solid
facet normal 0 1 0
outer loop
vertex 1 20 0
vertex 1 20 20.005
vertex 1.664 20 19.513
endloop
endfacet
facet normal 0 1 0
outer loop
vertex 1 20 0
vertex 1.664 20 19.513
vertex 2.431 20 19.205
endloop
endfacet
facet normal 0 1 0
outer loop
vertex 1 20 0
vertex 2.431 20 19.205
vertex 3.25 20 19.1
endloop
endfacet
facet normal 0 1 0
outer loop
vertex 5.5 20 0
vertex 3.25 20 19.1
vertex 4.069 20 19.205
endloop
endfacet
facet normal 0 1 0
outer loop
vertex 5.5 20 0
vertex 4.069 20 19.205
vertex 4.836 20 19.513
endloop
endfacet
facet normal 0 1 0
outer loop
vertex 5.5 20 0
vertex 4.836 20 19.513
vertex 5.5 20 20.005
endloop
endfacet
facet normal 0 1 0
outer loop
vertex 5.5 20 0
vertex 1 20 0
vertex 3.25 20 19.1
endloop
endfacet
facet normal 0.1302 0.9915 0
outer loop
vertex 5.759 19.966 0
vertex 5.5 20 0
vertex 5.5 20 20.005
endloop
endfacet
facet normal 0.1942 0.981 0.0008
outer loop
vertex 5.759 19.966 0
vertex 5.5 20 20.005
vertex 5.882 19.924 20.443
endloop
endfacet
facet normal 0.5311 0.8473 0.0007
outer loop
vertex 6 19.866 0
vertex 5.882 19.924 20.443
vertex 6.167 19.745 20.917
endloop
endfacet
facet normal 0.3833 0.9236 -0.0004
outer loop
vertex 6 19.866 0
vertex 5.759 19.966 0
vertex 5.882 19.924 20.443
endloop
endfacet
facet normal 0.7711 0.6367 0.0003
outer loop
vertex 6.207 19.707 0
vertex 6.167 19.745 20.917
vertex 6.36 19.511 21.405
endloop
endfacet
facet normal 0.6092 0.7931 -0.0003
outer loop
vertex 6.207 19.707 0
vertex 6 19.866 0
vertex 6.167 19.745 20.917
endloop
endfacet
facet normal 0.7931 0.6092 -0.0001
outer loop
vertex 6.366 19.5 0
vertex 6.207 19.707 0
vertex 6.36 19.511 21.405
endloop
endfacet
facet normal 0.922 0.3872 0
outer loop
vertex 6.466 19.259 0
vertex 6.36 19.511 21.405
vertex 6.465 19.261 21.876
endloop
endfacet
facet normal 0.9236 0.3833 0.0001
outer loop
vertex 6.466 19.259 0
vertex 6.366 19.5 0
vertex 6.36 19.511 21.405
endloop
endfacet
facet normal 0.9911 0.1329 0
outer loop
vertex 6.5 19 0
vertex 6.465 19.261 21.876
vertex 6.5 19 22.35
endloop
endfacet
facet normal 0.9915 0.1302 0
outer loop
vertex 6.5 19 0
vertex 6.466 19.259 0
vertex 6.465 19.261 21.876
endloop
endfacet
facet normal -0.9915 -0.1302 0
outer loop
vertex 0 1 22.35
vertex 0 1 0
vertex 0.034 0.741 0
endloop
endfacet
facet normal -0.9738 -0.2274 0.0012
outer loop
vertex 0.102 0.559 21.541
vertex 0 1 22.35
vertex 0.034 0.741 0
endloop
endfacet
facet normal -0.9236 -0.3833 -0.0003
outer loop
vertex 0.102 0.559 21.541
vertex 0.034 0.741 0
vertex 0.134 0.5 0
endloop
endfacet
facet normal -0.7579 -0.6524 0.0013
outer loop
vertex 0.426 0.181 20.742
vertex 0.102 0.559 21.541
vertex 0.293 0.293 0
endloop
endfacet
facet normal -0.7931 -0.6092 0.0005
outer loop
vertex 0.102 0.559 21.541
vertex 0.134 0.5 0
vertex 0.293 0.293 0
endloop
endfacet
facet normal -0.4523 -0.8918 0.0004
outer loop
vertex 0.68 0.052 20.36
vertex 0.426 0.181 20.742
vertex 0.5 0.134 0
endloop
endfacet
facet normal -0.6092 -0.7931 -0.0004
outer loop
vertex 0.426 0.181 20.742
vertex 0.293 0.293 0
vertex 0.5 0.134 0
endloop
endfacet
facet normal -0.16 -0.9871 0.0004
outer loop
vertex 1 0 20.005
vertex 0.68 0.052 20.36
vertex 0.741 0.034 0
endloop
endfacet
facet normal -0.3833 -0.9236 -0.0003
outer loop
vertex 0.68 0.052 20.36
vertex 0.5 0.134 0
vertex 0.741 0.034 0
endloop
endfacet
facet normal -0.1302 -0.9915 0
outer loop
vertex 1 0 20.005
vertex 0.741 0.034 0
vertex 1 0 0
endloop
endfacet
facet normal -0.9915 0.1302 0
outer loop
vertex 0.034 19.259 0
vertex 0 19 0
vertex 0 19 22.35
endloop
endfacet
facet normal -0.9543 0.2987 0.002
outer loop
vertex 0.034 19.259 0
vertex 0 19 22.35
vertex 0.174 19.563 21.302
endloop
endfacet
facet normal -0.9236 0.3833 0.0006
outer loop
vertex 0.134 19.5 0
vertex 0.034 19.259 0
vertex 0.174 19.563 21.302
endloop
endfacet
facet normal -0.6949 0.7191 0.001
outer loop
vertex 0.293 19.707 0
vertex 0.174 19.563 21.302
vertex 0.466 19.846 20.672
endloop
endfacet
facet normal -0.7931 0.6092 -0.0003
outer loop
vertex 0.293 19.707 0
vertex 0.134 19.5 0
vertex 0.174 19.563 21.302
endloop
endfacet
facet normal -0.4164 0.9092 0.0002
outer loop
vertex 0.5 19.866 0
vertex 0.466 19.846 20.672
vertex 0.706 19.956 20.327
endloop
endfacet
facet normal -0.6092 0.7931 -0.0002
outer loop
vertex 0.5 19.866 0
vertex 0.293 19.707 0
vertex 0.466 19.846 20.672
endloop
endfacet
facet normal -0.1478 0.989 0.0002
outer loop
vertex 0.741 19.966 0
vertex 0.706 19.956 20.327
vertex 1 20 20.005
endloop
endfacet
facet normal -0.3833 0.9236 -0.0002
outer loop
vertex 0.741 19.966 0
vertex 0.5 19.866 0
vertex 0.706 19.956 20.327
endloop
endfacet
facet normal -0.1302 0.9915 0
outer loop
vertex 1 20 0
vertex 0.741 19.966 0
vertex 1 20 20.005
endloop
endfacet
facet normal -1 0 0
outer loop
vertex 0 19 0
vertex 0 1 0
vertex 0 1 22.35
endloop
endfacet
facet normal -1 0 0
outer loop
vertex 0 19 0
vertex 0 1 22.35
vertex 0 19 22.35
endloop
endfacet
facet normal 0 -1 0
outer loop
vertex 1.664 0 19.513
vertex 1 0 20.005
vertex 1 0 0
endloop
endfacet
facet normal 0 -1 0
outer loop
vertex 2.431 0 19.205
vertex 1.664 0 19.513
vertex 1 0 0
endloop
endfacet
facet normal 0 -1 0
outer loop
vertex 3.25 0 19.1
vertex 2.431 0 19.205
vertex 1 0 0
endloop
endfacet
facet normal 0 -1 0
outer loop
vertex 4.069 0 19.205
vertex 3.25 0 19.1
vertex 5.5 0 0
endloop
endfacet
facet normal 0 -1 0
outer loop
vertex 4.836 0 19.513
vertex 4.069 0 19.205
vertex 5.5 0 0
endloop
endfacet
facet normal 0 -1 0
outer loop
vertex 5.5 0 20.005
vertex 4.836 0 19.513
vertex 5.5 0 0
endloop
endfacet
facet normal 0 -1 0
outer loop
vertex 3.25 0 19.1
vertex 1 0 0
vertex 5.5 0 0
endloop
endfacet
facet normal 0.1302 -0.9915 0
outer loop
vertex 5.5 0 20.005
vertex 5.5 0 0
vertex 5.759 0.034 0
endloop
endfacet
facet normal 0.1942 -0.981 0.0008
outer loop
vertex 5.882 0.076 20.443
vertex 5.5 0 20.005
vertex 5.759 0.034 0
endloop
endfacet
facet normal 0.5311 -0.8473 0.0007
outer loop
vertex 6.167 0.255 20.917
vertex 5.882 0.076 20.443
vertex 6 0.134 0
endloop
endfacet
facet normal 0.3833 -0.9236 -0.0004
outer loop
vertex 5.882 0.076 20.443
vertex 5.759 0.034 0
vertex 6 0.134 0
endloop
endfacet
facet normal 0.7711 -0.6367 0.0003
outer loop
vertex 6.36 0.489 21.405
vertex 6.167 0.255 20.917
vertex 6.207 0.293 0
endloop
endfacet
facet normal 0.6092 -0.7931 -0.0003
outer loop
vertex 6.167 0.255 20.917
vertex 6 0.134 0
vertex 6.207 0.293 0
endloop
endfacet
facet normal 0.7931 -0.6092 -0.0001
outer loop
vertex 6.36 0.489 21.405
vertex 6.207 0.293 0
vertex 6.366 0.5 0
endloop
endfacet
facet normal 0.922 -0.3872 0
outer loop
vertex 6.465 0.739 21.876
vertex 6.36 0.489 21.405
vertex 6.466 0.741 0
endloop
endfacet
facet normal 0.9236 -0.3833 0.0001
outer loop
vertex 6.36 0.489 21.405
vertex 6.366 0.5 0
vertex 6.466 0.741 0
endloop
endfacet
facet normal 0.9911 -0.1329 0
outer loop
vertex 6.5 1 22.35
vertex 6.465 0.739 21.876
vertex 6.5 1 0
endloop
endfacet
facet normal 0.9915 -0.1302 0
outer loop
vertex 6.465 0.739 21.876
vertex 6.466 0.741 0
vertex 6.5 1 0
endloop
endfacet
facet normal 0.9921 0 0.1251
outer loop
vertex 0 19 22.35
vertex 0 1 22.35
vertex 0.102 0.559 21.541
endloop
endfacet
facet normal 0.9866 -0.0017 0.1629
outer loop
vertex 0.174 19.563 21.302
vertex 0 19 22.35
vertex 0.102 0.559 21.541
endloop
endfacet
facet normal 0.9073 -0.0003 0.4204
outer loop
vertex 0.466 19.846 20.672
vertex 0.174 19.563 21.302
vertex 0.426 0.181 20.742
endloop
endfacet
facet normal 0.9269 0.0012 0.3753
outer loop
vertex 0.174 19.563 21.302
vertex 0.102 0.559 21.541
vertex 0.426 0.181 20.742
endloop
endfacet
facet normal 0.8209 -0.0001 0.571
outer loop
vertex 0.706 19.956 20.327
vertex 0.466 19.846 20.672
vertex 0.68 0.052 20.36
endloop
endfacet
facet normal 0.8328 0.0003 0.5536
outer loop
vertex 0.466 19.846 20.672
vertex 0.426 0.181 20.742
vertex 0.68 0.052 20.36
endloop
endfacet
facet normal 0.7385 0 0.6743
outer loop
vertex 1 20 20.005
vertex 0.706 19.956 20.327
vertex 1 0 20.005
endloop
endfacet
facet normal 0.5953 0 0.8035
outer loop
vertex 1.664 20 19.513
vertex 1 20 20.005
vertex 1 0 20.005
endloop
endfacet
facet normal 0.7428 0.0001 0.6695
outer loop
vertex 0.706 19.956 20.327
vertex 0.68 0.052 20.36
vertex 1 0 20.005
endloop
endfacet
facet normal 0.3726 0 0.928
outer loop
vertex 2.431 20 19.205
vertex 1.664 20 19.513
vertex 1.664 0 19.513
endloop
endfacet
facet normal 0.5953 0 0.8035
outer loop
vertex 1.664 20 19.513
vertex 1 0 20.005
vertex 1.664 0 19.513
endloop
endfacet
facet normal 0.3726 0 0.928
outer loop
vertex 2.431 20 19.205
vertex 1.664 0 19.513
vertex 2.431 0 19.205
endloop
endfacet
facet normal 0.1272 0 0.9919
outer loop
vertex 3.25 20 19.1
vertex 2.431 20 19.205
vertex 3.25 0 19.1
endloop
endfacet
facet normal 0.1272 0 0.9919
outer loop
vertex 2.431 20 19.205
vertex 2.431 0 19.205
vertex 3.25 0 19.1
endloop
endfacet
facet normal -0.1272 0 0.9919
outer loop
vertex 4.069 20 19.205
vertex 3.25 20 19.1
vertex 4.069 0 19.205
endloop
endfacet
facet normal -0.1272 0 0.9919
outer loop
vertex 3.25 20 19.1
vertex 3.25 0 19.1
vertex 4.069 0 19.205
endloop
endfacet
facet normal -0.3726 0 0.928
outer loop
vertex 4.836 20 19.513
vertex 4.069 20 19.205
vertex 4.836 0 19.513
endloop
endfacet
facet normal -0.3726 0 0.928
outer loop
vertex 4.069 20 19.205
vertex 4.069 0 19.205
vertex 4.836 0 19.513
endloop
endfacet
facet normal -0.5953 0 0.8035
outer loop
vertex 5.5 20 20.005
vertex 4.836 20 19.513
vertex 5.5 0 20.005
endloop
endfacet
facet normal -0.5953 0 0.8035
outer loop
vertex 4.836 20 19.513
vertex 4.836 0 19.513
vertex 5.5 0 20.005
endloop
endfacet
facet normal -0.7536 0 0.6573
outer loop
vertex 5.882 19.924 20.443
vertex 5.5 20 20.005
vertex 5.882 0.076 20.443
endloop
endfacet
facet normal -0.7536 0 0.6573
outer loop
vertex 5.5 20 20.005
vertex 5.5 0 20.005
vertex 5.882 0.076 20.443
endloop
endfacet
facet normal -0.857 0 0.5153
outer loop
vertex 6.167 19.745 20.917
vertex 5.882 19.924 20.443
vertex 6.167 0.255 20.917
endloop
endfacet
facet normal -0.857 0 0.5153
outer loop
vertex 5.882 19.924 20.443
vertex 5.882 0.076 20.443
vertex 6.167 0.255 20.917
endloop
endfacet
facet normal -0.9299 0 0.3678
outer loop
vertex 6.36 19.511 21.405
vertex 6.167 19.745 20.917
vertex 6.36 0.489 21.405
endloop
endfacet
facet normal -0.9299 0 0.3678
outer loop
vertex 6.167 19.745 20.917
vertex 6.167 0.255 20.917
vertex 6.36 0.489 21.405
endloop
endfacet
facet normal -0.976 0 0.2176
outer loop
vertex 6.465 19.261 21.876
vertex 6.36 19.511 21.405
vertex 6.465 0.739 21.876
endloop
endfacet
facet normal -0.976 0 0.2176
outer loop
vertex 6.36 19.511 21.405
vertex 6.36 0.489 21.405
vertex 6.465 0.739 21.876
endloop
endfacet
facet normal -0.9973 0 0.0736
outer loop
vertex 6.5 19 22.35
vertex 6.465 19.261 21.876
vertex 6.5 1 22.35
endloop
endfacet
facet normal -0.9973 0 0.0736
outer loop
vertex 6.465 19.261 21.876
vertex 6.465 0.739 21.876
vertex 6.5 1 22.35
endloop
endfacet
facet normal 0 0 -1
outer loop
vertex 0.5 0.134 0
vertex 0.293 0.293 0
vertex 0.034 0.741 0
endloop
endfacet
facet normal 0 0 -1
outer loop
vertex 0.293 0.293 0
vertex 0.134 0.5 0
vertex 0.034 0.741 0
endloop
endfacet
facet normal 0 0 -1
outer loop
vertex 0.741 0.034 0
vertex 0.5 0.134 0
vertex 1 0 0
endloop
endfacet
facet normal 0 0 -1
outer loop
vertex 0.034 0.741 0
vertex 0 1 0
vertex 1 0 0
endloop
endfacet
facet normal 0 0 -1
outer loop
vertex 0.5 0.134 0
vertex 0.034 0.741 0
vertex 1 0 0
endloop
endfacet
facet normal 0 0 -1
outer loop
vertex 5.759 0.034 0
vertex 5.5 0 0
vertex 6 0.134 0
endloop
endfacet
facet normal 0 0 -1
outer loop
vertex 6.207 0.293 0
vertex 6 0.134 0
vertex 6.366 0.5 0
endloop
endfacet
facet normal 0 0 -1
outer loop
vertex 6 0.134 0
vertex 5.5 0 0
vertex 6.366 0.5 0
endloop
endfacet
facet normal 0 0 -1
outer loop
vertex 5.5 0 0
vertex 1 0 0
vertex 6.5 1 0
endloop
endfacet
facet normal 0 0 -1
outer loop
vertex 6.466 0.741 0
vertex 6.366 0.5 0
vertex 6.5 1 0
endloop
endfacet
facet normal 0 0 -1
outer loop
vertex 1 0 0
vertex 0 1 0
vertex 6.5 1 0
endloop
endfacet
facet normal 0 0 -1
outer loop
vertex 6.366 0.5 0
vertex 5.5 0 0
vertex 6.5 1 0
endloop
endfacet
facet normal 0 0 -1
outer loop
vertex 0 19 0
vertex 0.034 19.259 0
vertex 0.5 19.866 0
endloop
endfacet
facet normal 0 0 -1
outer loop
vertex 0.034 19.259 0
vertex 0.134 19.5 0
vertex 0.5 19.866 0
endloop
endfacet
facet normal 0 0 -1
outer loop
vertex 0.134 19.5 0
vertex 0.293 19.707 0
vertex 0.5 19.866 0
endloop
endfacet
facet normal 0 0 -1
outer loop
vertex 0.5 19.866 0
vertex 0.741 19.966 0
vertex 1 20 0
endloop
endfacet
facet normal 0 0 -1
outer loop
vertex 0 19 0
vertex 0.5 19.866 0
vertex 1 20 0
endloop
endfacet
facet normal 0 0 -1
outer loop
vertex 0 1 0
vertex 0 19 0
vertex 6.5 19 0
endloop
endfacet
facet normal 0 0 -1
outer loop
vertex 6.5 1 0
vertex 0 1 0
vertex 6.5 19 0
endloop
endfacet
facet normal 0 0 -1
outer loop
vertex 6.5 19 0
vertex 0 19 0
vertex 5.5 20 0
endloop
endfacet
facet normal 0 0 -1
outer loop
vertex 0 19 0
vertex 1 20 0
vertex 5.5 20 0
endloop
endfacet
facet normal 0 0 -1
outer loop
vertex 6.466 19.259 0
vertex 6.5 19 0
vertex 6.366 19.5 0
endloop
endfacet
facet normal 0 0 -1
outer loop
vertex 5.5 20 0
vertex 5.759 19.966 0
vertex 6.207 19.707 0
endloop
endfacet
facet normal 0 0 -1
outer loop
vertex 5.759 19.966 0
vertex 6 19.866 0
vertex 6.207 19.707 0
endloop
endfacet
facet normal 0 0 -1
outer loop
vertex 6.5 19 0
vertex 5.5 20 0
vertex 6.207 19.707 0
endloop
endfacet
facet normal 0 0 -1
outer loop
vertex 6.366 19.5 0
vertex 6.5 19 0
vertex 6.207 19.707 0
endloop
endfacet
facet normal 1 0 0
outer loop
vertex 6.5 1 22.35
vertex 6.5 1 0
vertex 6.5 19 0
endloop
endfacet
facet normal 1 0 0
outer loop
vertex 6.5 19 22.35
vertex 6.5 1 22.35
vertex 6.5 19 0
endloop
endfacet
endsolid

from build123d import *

# Parameters (mm, degrees)
F0_W        = 6.5
F0_H        = 20
F1_DEPTH    = 22.35
F3_DEPTH    = 25
F4_T1_DEPTH = 27.35


# Not quite as in the source:
# - a fillet or chamfer that OpenCascade refuses, or shapes differently, is made with other operations: its cross-section is extruded or revolved along the edge and cut away or added


with BuildPart() as f1:
    # F0 (on Top) → F1 (new body)
    with BuildSketch(Plane.XY):
        with Locations((3.25, 10)):
            Rectangle(F0_W, F0_H)
    extrude(amount=F1_DEPTH)

    # F2 (on face) → F3 (cut)
    with BuildSketch(Plane.XZ):
        with BuildLine():
            ThreePointArc((6.5, 22.35), (3.25, 25.6), (0, 22.35))
            Line((0, 22.35), (6.5, 22.35))
        make_face()
        with BuildLine():
            Line((6.5, 22.35), (0, 22.35))
            ThreePointArc((0, 22.35), (3.25, 19.1), (6.5, 22.35))
        make_face()
    extrude(amount=-F3_DEPTH, mode=Mode.SUBTRACT)

    # F4: fillet of radius 1 on 4 edges, made by hand

    # F4_s2 → F4_t1 (cut)
    with BuildSketch(Plane.XY.offset(-2.5)):
        with BuildLine():
            ThreePointArc((5.5, 0), (6.2071067812, 0.2928932188), (6.5, 1))
            Line((6.5, 1), (6.5, 0))
            Line((6.5, 0), (5.5, 0))
        make_face()
        with BuildLine():
            ThreePointArc((0, 1), (0.2928932188, 0.2928932188), (1, 0))
            Line((1, 0), (0, 0))
            Line((0, 0), (0, 1))
        make_face()
        with BuildLine():
            ThreePointArc((5.5, 20), (6.2071067812, 19.7071067812), (6.5, 19))
            Line((6.5, 19), (6.5, 20))
            Line((6.5, 20), (5.5, 20))
        make_face()
        with BuildLine():
            ThreePointArc((0, 19), (0.2928932188, 19.7071067812), (1, 20))
            Line((1, 20), (0, 20))
            Line((0, 20), (0, 19))
        make_face()
    extrude(amount=F4_T1_DEPTH, mode=Mode.SUBTRACT)


solid = f1.part
